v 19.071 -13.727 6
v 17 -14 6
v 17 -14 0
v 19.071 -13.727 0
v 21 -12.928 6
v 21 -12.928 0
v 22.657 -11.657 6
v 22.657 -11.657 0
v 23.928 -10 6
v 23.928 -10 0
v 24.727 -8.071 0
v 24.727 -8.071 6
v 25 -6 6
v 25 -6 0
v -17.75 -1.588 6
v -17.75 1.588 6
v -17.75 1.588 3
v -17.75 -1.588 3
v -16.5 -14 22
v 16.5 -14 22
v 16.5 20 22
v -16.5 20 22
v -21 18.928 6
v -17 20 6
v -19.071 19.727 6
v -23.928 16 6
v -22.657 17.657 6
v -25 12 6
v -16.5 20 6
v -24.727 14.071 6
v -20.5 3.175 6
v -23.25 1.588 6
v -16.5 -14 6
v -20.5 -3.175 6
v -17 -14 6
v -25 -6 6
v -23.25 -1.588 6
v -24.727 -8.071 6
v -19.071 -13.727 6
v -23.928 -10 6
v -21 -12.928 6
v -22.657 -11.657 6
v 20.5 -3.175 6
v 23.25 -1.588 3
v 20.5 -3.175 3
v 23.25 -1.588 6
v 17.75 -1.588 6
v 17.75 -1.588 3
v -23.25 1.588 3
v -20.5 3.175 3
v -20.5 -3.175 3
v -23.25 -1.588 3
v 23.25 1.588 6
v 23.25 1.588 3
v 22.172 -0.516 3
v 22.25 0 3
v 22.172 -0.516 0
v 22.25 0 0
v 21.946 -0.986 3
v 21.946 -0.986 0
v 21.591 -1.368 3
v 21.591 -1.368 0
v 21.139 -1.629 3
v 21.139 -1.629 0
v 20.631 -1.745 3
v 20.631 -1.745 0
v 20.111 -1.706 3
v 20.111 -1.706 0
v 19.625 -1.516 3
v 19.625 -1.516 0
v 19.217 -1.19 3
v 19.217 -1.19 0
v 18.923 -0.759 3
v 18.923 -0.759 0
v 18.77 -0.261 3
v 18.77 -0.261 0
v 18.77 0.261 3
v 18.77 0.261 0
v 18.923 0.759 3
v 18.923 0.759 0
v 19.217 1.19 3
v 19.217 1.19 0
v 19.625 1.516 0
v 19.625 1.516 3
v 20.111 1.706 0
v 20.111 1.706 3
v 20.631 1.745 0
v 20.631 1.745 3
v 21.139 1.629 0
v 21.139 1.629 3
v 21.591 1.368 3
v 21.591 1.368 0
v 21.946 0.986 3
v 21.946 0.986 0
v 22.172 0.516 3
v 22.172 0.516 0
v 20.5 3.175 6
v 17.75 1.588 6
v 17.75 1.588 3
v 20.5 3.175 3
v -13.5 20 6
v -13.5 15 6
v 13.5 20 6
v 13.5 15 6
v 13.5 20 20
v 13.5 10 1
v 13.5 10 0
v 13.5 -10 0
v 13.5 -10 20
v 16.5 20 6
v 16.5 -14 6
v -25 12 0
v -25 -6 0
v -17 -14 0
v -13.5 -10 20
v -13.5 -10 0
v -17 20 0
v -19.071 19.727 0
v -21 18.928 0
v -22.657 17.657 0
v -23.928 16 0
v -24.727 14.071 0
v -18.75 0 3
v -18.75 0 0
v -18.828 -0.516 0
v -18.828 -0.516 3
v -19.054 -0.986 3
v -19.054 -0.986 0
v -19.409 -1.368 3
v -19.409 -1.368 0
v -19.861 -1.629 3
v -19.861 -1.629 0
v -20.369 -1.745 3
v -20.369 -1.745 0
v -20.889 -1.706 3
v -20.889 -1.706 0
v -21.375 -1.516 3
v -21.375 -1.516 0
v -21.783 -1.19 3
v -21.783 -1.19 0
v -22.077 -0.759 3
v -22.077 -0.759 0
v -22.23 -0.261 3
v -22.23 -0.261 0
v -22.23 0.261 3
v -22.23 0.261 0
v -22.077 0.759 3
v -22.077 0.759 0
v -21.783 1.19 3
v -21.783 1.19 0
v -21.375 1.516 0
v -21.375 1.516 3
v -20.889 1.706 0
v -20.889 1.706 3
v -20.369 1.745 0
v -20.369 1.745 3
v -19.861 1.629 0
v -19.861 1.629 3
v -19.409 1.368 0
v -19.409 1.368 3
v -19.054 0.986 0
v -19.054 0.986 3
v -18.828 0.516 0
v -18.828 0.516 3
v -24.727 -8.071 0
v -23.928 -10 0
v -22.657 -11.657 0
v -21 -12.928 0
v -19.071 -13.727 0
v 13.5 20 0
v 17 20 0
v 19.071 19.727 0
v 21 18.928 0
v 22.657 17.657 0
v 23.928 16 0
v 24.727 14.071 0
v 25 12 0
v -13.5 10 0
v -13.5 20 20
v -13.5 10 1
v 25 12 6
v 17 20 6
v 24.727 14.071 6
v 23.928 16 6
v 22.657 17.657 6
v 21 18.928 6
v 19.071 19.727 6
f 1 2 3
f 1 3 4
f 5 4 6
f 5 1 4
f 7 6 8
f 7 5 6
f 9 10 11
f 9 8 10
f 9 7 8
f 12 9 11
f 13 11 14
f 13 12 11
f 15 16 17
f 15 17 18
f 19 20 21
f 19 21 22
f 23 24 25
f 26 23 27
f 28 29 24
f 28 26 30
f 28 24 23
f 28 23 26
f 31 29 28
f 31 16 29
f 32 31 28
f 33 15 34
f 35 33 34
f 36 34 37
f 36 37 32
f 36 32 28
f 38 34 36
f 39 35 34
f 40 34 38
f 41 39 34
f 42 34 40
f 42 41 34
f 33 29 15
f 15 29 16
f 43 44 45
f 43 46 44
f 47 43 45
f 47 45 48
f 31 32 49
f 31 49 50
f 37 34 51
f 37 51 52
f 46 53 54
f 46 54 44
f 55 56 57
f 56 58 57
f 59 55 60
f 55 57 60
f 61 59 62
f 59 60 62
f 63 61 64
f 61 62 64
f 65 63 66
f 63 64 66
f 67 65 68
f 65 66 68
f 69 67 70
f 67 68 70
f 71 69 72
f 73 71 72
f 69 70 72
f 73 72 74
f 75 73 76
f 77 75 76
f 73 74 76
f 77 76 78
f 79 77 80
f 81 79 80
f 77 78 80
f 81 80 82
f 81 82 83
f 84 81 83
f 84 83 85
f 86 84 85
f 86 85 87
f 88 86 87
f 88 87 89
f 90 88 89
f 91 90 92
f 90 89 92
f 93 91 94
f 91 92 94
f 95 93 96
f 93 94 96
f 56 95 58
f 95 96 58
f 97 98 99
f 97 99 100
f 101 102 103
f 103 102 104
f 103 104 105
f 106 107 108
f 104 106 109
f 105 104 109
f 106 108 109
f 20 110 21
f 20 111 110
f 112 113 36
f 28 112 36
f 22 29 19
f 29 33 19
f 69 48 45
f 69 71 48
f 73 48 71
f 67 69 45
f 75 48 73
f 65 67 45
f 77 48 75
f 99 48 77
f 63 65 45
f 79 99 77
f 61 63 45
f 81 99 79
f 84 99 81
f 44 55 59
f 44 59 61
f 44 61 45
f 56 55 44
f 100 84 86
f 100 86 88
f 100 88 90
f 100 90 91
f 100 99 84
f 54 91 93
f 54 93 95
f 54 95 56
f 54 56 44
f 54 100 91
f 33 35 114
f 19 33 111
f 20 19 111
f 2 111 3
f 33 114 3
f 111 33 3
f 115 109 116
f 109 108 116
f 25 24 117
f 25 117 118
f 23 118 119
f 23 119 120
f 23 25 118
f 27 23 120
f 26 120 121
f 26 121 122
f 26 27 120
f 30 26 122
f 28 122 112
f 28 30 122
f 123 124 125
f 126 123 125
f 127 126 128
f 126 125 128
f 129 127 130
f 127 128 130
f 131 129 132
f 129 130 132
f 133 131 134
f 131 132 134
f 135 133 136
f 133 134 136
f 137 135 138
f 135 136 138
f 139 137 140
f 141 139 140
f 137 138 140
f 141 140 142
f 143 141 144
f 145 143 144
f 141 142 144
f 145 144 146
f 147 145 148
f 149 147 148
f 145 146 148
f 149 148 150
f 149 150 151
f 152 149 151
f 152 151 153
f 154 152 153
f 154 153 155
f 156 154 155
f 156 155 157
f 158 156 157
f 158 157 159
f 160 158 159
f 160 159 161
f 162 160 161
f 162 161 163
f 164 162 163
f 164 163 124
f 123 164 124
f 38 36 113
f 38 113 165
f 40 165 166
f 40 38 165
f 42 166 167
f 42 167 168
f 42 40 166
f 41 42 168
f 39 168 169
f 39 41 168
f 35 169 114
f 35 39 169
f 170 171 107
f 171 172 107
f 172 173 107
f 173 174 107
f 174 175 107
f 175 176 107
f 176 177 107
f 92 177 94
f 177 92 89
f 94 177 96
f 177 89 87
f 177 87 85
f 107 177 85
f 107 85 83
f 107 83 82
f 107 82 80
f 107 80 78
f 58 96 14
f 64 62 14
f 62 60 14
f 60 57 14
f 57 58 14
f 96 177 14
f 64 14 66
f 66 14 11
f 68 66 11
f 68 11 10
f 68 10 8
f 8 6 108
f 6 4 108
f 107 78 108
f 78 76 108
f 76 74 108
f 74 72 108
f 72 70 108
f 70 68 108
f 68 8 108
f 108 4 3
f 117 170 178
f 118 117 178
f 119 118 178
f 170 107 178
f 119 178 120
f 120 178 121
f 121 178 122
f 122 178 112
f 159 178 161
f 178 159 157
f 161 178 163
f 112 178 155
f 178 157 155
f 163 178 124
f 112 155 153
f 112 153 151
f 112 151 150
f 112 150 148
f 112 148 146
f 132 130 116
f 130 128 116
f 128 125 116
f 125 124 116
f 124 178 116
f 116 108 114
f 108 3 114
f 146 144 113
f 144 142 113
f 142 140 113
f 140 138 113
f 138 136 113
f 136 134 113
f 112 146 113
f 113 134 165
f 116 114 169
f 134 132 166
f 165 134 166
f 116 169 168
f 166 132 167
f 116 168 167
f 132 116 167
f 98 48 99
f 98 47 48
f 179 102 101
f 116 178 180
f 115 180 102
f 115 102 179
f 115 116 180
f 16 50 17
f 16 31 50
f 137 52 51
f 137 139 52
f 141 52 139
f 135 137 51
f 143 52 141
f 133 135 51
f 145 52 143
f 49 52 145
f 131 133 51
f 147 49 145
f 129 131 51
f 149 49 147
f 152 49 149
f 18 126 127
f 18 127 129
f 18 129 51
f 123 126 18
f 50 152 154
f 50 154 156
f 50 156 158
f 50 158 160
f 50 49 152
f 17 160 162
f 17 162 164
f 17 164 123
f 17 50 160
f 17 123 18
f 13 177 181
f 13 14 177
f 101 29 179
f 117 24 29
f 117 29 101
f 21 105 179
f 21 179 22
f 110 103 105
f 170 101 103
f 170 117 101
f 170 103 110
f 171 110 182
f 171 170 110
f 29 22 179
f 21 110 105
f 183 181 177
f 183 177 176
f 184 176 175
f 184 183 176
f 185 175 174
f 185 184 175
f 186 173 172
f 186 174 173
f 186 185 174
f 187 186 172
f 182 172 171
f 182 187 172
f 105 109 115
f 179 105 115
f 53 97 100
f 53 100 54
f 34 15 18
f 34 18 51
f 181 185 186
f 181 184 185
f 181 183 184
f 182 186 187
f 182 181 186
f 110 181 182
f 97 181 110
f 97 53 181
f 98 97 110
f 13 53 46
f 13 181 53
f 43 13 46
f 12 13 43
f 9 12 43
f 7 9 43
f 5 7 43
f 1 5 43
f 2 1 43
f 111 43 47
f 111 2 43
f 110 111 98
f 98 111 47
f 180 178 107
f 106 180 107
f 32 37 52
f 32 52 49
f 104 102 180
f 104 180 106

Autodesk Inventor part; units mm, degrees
ref_plane "YZ Plane" through (0, 0, 0) normal (1, 0, 0) x (0, 1, 0)
ref_plane "XZ Plane" through (0, 0, 0) normal (0, 1, 0) x (-1, 0, 0)
ref_plane "XY Plane" through (0, 0, 0) normal (0, 0, 1) x (1, 0, 0)
sketch "Skizze1" plane through (0, 0, 0) normal (0, 0, 1) x (1, 0, 0)
  line L0 (-25, -14) -> (25, -14)
  line L1 (25, -14) -> (25, 14)
  line L2 (25, 14) -> (-25, 14)
  line L3 (-25, 14) -> (-25, -14)
  line L4 (-25, -14) -> (25, 14) construction
  line L5 (25, -14) -> (-25, 14) construction
  line L6 (-13.5, -10) -> (13.5, -10)
  line L7 (13.5, -10) -> (13.5, 10)
  line L8 (13.5, 10) -> (-13.5, 10)
  line L9 (-13.5, 10) -> (-13.5, -10)
  line L10 (-13.5, -10) -> (13.5, 10) construction
  line L11 (13.5, -10) -> (-13.5, 10) construction
  circle A0 centre (-20.5, 0) radius 1.75
  circle A1 centre (20.5, 0) radius 1.75
  line L12 (-20.5, 0) -> (20.5, 0) construction
  point P0 (0, 0)
  point P1 (0, 0)
  point P2 (0, 0)
  point P3 (0, 0)
  dimension "d0" = 50
  dimension "d1" = 20
  dimension "d2" = 27
  dimension "d3" = 41
  dimension "d4" = 3.5
  dimension "d5" = 28
extrude "Extrusion1" add sketch "Skizze1" along normal blind 6
sketch "Skizze2" plane through (0, 0, 6) normal (0, 0, 1) x (1, 0, 0)
  line L0 (-13.5, -10) -> (-13.5, 10) projected
  line L1 (-13.5, 10) -> (13.5, 10) projected
  line L2 (13.5, 10) -> (13.5, -10) projected
  line L3 (13.5, -10) -> (-13.5, -10) projected
  circle A0 centre (20.5, 0) radius 1.75 projected
  circle A1 centre (-20.5, 0) radius 1.75 projected
  line L4 (-25, -14) -> (25, -14) projected
  line L5 (25, -14) -> (25, 14) projected
  line L6 (25, 14) -> (-25, 14) projected
  line L7 (-25, 14) -> (-25, -14) projected
  line L8 (-20.5, 3.1754) -> (-17.75, 1.5877)
  line L9 (-17.75, 1.5877) -> (-17.75, -1.5877)
  line L10 (-17.75, -1.5877) -> (-20.5, -3.1754)
  line L11 (-20.5, -3.1754) -> (-23.25, -1.5877)
  line L12 (-23.25, -1.5877) -> (-23.25, 1.5877)
  line L13 (-23.25, 1.5877) -> (-20.5, 3.1754)
  line L14 (20.5, 3.1754) -> (23.25, 1.5877)
  line L15 (23.25, 1.5877) -> (23.25, -1.5877)
  line L16 (23.25, -1.5877) -> (20.5, -3.1754)
  line L17 (20.5, -3.1754) -> (17.75, -1.5877)
  line L18 (17.75, -1.5877) -> (17.75, 1.5877)
  line L19 (17.75, 1.5877) -> (20.5, 3.1754)
  line L20 (-25, 14) -> (-25, -14) projected
  line L21 (25, -14) -> (25, 14) projected
  point P0 (0, 0)
  dimension "d8" = 5.5
extrude "Extrusion2" cut sketch "Skizze2" against normal blind 3 contours A0 | A1 | L8 L9 L10 L11 L12 L13 | L14 L15 L16 L17 L18 L19
sketch "Skizze3" plane through (0, 0, 6) normal (0, 0, 1) x (1, 0, 0)
  line L0 (-23.25, 1.5877) -> (-20.5, 3.1754) projected
  line L1 (-20.5, 3.1754) -> (-17.75, 1.5877) projected
  line L2 (-17.75, 1.5877) -> (-17.75, -1.5877) projected
  line L3 (-17.75, -1.5877) -> (-20.5, -3.1754) projected
  line L4 (-20.5, -3.1754) -> (-23.25, -1.5877) projected
  line L5 (-23.25, -1.5877) -> (-23.25, 1.5877) projected
  line L6 (17.75, 1.5877) -> (20.5, 3.1754) projected
  line L7 (20.5, 3.1754) -> (23.25, 1.5877) projected
  line L8 (23.25, 1.5877) -> (23.25, -1.5877) projected
  line L9 (23.25, -1.5877) -> (20.5, -3.1754) projected
  line L10 (20.5, -3.1754) -> (17.75, -1.5877) projected
  line L11 (17.75, -1.5877) -> (17.75, 1.5877) projected
  line L12 (-13.5, -10) -> (-13.5, 10) projected
  line L13 (-13.5, 10) -> (13.5, 10) projected
  line L14 (13.5, 10) -> (13.5, -10) projected
  line L15 (13.5, -10) -> (-13.5, -10) projected
  line L16 (-25, -14) -> (25, -14) projected
  line L17 (25, -14) -> (25, 14) projected
  line L18 (25, 14) -> (-25, 14) projected
  line L19 (-25, 14) -> (-25, -14) projected
  line L20 (-16.5, -14) -> (16.5, -14)
  line L21 (16.5, -14) -> (16.5, 14)
  line L22 (16.5, 14) -> (-16.5, 14)
  line L23 (-16.5, 14) -> (-16.5, -14)
  line L24 (-16.5, -14) -> (16.5, 14) construction
  line L25 (16.5, -14) -> (-16.5, 14) construction
  point P0 (0, 0)
  dimension "d11" = 3
extrude "Extrusion3" add sketch "Skizze3" along normal blind 14 contours L23 L18 L21 L16
sketch "Skizze4" plane through (0, 0, 20) normal (0, 0, 1) x (1, 0, 0)
  line L0 (-13.5, 10) -> (13.5, 10) projected
  line L1 (13.5, 10) -> (13.5, -10) projected
  line L2 (13.5, -10) -> (-13.5, -10) projected
  line L3 (-13.5, -10) -> (-13.5, 10) projected
  line L4 (16.5, 14) -> (-16.5, 14) projected
  line L5 (-16.5, 14) -> (-16.5, -14) projected
  line L6 (-16.5, -14) -> (16.5, -14) projected
  line L7 (16.5, -14) -> (16.5, 14) projected
  point P0 (0, 0)
extrude "Extrusion4" add sketch "Skizze4" along normal blind 2 contours L0 L1 L2 L3 | L7 L6 L5 L4
sketch "Skizze5" plane through (-13.5, 10, 0) normal (0, -1, 0) x (1, 0, 0)
  line L0 (27, 0) -> (0, 0) projected
  line L1 (27, 0) -> (27, 20) projected
  line L2 (0, 20) -> (27, 20) projected
  line L3 (0, 0) -> (0, 20) projected
  line L4 (38.5, 0) -> (-11.5, 0) projected
  line L5 (-11.5, 0) -> (-11.5, 6) projected
  line L6 (-3, 6) -> (-11.5, 6) projected
  line L7 (-3, 6) -> (-3, 22) projected
  line L8 (30, 22) -> (-3, 22) projected
  line L9 (30, 6) -> (30, 22) projected
  line L10 (38.5, 6) -> (30, 6) projected
  line L11 (38.5, 0) -> (38.5, 6) projected
  line L12 (0, 6) -> (27, 6)
  line L13 (27, 6) -> (27, 20)
  line L14 (27, 20) -> (0, 20)
  line L15 (0, 20) -> (0, 6)
  line L16 (0, 6) -> (27, 20) construction
  line L17 (27, 6) -> (0, 20) construction
  point P0 (13.5, 0)
  point P1 (13.5, 13)
extrude "Extrusion5" cut sketch "Skizze5" against normal through all contours L12 L3 L2 L1
sketch "Skizze7" plane through (-25, 14, 0) normal (0, 1, 0) x (1, 0, 0)
  line L0 (38.5, 0) -> (38.5, -6) projected
  line L1 (11.5, -20) -> (11.5, -6) projected
  line L2 (11.5, -6) -> (38.5, -6) projected
  line L3 (38.5, -6) -> (38.5, -20) projected
  line L4 (38.5, -20) -> (11.5, -20) projected
  line L5 (50, 0) -> (0, 0) projected
  line L6 (0, 0) -> (0, -6) projected
  line L7 (8.5, -6) -> (0, -6) projected
  line L8 (8.5, -6) -> (8.5, -22) projected
  line L9 (41.5, -22) -> (8.5, -22) projected
  line L10 (41.5, -6) -> (41.5, -22) projected
  line L11 (50, -6) -> (41.5, -6) projected
  line L12 (50, 0) -> (50, -6) projected
  point P0 (25, 0)
extrude "Extrusion6" add sketch "Skizze7" along normal blind 6
chamfer "Fase1" distance 5 angle 45 1 edges at (0, 10, 6)
fillet "Rundung1" radius 8 4 edges at (25, -14, 3) (25, 20, 3) (-25, -14, 3) (-25, 20, 3)
properties part number "kaltgeraete"
